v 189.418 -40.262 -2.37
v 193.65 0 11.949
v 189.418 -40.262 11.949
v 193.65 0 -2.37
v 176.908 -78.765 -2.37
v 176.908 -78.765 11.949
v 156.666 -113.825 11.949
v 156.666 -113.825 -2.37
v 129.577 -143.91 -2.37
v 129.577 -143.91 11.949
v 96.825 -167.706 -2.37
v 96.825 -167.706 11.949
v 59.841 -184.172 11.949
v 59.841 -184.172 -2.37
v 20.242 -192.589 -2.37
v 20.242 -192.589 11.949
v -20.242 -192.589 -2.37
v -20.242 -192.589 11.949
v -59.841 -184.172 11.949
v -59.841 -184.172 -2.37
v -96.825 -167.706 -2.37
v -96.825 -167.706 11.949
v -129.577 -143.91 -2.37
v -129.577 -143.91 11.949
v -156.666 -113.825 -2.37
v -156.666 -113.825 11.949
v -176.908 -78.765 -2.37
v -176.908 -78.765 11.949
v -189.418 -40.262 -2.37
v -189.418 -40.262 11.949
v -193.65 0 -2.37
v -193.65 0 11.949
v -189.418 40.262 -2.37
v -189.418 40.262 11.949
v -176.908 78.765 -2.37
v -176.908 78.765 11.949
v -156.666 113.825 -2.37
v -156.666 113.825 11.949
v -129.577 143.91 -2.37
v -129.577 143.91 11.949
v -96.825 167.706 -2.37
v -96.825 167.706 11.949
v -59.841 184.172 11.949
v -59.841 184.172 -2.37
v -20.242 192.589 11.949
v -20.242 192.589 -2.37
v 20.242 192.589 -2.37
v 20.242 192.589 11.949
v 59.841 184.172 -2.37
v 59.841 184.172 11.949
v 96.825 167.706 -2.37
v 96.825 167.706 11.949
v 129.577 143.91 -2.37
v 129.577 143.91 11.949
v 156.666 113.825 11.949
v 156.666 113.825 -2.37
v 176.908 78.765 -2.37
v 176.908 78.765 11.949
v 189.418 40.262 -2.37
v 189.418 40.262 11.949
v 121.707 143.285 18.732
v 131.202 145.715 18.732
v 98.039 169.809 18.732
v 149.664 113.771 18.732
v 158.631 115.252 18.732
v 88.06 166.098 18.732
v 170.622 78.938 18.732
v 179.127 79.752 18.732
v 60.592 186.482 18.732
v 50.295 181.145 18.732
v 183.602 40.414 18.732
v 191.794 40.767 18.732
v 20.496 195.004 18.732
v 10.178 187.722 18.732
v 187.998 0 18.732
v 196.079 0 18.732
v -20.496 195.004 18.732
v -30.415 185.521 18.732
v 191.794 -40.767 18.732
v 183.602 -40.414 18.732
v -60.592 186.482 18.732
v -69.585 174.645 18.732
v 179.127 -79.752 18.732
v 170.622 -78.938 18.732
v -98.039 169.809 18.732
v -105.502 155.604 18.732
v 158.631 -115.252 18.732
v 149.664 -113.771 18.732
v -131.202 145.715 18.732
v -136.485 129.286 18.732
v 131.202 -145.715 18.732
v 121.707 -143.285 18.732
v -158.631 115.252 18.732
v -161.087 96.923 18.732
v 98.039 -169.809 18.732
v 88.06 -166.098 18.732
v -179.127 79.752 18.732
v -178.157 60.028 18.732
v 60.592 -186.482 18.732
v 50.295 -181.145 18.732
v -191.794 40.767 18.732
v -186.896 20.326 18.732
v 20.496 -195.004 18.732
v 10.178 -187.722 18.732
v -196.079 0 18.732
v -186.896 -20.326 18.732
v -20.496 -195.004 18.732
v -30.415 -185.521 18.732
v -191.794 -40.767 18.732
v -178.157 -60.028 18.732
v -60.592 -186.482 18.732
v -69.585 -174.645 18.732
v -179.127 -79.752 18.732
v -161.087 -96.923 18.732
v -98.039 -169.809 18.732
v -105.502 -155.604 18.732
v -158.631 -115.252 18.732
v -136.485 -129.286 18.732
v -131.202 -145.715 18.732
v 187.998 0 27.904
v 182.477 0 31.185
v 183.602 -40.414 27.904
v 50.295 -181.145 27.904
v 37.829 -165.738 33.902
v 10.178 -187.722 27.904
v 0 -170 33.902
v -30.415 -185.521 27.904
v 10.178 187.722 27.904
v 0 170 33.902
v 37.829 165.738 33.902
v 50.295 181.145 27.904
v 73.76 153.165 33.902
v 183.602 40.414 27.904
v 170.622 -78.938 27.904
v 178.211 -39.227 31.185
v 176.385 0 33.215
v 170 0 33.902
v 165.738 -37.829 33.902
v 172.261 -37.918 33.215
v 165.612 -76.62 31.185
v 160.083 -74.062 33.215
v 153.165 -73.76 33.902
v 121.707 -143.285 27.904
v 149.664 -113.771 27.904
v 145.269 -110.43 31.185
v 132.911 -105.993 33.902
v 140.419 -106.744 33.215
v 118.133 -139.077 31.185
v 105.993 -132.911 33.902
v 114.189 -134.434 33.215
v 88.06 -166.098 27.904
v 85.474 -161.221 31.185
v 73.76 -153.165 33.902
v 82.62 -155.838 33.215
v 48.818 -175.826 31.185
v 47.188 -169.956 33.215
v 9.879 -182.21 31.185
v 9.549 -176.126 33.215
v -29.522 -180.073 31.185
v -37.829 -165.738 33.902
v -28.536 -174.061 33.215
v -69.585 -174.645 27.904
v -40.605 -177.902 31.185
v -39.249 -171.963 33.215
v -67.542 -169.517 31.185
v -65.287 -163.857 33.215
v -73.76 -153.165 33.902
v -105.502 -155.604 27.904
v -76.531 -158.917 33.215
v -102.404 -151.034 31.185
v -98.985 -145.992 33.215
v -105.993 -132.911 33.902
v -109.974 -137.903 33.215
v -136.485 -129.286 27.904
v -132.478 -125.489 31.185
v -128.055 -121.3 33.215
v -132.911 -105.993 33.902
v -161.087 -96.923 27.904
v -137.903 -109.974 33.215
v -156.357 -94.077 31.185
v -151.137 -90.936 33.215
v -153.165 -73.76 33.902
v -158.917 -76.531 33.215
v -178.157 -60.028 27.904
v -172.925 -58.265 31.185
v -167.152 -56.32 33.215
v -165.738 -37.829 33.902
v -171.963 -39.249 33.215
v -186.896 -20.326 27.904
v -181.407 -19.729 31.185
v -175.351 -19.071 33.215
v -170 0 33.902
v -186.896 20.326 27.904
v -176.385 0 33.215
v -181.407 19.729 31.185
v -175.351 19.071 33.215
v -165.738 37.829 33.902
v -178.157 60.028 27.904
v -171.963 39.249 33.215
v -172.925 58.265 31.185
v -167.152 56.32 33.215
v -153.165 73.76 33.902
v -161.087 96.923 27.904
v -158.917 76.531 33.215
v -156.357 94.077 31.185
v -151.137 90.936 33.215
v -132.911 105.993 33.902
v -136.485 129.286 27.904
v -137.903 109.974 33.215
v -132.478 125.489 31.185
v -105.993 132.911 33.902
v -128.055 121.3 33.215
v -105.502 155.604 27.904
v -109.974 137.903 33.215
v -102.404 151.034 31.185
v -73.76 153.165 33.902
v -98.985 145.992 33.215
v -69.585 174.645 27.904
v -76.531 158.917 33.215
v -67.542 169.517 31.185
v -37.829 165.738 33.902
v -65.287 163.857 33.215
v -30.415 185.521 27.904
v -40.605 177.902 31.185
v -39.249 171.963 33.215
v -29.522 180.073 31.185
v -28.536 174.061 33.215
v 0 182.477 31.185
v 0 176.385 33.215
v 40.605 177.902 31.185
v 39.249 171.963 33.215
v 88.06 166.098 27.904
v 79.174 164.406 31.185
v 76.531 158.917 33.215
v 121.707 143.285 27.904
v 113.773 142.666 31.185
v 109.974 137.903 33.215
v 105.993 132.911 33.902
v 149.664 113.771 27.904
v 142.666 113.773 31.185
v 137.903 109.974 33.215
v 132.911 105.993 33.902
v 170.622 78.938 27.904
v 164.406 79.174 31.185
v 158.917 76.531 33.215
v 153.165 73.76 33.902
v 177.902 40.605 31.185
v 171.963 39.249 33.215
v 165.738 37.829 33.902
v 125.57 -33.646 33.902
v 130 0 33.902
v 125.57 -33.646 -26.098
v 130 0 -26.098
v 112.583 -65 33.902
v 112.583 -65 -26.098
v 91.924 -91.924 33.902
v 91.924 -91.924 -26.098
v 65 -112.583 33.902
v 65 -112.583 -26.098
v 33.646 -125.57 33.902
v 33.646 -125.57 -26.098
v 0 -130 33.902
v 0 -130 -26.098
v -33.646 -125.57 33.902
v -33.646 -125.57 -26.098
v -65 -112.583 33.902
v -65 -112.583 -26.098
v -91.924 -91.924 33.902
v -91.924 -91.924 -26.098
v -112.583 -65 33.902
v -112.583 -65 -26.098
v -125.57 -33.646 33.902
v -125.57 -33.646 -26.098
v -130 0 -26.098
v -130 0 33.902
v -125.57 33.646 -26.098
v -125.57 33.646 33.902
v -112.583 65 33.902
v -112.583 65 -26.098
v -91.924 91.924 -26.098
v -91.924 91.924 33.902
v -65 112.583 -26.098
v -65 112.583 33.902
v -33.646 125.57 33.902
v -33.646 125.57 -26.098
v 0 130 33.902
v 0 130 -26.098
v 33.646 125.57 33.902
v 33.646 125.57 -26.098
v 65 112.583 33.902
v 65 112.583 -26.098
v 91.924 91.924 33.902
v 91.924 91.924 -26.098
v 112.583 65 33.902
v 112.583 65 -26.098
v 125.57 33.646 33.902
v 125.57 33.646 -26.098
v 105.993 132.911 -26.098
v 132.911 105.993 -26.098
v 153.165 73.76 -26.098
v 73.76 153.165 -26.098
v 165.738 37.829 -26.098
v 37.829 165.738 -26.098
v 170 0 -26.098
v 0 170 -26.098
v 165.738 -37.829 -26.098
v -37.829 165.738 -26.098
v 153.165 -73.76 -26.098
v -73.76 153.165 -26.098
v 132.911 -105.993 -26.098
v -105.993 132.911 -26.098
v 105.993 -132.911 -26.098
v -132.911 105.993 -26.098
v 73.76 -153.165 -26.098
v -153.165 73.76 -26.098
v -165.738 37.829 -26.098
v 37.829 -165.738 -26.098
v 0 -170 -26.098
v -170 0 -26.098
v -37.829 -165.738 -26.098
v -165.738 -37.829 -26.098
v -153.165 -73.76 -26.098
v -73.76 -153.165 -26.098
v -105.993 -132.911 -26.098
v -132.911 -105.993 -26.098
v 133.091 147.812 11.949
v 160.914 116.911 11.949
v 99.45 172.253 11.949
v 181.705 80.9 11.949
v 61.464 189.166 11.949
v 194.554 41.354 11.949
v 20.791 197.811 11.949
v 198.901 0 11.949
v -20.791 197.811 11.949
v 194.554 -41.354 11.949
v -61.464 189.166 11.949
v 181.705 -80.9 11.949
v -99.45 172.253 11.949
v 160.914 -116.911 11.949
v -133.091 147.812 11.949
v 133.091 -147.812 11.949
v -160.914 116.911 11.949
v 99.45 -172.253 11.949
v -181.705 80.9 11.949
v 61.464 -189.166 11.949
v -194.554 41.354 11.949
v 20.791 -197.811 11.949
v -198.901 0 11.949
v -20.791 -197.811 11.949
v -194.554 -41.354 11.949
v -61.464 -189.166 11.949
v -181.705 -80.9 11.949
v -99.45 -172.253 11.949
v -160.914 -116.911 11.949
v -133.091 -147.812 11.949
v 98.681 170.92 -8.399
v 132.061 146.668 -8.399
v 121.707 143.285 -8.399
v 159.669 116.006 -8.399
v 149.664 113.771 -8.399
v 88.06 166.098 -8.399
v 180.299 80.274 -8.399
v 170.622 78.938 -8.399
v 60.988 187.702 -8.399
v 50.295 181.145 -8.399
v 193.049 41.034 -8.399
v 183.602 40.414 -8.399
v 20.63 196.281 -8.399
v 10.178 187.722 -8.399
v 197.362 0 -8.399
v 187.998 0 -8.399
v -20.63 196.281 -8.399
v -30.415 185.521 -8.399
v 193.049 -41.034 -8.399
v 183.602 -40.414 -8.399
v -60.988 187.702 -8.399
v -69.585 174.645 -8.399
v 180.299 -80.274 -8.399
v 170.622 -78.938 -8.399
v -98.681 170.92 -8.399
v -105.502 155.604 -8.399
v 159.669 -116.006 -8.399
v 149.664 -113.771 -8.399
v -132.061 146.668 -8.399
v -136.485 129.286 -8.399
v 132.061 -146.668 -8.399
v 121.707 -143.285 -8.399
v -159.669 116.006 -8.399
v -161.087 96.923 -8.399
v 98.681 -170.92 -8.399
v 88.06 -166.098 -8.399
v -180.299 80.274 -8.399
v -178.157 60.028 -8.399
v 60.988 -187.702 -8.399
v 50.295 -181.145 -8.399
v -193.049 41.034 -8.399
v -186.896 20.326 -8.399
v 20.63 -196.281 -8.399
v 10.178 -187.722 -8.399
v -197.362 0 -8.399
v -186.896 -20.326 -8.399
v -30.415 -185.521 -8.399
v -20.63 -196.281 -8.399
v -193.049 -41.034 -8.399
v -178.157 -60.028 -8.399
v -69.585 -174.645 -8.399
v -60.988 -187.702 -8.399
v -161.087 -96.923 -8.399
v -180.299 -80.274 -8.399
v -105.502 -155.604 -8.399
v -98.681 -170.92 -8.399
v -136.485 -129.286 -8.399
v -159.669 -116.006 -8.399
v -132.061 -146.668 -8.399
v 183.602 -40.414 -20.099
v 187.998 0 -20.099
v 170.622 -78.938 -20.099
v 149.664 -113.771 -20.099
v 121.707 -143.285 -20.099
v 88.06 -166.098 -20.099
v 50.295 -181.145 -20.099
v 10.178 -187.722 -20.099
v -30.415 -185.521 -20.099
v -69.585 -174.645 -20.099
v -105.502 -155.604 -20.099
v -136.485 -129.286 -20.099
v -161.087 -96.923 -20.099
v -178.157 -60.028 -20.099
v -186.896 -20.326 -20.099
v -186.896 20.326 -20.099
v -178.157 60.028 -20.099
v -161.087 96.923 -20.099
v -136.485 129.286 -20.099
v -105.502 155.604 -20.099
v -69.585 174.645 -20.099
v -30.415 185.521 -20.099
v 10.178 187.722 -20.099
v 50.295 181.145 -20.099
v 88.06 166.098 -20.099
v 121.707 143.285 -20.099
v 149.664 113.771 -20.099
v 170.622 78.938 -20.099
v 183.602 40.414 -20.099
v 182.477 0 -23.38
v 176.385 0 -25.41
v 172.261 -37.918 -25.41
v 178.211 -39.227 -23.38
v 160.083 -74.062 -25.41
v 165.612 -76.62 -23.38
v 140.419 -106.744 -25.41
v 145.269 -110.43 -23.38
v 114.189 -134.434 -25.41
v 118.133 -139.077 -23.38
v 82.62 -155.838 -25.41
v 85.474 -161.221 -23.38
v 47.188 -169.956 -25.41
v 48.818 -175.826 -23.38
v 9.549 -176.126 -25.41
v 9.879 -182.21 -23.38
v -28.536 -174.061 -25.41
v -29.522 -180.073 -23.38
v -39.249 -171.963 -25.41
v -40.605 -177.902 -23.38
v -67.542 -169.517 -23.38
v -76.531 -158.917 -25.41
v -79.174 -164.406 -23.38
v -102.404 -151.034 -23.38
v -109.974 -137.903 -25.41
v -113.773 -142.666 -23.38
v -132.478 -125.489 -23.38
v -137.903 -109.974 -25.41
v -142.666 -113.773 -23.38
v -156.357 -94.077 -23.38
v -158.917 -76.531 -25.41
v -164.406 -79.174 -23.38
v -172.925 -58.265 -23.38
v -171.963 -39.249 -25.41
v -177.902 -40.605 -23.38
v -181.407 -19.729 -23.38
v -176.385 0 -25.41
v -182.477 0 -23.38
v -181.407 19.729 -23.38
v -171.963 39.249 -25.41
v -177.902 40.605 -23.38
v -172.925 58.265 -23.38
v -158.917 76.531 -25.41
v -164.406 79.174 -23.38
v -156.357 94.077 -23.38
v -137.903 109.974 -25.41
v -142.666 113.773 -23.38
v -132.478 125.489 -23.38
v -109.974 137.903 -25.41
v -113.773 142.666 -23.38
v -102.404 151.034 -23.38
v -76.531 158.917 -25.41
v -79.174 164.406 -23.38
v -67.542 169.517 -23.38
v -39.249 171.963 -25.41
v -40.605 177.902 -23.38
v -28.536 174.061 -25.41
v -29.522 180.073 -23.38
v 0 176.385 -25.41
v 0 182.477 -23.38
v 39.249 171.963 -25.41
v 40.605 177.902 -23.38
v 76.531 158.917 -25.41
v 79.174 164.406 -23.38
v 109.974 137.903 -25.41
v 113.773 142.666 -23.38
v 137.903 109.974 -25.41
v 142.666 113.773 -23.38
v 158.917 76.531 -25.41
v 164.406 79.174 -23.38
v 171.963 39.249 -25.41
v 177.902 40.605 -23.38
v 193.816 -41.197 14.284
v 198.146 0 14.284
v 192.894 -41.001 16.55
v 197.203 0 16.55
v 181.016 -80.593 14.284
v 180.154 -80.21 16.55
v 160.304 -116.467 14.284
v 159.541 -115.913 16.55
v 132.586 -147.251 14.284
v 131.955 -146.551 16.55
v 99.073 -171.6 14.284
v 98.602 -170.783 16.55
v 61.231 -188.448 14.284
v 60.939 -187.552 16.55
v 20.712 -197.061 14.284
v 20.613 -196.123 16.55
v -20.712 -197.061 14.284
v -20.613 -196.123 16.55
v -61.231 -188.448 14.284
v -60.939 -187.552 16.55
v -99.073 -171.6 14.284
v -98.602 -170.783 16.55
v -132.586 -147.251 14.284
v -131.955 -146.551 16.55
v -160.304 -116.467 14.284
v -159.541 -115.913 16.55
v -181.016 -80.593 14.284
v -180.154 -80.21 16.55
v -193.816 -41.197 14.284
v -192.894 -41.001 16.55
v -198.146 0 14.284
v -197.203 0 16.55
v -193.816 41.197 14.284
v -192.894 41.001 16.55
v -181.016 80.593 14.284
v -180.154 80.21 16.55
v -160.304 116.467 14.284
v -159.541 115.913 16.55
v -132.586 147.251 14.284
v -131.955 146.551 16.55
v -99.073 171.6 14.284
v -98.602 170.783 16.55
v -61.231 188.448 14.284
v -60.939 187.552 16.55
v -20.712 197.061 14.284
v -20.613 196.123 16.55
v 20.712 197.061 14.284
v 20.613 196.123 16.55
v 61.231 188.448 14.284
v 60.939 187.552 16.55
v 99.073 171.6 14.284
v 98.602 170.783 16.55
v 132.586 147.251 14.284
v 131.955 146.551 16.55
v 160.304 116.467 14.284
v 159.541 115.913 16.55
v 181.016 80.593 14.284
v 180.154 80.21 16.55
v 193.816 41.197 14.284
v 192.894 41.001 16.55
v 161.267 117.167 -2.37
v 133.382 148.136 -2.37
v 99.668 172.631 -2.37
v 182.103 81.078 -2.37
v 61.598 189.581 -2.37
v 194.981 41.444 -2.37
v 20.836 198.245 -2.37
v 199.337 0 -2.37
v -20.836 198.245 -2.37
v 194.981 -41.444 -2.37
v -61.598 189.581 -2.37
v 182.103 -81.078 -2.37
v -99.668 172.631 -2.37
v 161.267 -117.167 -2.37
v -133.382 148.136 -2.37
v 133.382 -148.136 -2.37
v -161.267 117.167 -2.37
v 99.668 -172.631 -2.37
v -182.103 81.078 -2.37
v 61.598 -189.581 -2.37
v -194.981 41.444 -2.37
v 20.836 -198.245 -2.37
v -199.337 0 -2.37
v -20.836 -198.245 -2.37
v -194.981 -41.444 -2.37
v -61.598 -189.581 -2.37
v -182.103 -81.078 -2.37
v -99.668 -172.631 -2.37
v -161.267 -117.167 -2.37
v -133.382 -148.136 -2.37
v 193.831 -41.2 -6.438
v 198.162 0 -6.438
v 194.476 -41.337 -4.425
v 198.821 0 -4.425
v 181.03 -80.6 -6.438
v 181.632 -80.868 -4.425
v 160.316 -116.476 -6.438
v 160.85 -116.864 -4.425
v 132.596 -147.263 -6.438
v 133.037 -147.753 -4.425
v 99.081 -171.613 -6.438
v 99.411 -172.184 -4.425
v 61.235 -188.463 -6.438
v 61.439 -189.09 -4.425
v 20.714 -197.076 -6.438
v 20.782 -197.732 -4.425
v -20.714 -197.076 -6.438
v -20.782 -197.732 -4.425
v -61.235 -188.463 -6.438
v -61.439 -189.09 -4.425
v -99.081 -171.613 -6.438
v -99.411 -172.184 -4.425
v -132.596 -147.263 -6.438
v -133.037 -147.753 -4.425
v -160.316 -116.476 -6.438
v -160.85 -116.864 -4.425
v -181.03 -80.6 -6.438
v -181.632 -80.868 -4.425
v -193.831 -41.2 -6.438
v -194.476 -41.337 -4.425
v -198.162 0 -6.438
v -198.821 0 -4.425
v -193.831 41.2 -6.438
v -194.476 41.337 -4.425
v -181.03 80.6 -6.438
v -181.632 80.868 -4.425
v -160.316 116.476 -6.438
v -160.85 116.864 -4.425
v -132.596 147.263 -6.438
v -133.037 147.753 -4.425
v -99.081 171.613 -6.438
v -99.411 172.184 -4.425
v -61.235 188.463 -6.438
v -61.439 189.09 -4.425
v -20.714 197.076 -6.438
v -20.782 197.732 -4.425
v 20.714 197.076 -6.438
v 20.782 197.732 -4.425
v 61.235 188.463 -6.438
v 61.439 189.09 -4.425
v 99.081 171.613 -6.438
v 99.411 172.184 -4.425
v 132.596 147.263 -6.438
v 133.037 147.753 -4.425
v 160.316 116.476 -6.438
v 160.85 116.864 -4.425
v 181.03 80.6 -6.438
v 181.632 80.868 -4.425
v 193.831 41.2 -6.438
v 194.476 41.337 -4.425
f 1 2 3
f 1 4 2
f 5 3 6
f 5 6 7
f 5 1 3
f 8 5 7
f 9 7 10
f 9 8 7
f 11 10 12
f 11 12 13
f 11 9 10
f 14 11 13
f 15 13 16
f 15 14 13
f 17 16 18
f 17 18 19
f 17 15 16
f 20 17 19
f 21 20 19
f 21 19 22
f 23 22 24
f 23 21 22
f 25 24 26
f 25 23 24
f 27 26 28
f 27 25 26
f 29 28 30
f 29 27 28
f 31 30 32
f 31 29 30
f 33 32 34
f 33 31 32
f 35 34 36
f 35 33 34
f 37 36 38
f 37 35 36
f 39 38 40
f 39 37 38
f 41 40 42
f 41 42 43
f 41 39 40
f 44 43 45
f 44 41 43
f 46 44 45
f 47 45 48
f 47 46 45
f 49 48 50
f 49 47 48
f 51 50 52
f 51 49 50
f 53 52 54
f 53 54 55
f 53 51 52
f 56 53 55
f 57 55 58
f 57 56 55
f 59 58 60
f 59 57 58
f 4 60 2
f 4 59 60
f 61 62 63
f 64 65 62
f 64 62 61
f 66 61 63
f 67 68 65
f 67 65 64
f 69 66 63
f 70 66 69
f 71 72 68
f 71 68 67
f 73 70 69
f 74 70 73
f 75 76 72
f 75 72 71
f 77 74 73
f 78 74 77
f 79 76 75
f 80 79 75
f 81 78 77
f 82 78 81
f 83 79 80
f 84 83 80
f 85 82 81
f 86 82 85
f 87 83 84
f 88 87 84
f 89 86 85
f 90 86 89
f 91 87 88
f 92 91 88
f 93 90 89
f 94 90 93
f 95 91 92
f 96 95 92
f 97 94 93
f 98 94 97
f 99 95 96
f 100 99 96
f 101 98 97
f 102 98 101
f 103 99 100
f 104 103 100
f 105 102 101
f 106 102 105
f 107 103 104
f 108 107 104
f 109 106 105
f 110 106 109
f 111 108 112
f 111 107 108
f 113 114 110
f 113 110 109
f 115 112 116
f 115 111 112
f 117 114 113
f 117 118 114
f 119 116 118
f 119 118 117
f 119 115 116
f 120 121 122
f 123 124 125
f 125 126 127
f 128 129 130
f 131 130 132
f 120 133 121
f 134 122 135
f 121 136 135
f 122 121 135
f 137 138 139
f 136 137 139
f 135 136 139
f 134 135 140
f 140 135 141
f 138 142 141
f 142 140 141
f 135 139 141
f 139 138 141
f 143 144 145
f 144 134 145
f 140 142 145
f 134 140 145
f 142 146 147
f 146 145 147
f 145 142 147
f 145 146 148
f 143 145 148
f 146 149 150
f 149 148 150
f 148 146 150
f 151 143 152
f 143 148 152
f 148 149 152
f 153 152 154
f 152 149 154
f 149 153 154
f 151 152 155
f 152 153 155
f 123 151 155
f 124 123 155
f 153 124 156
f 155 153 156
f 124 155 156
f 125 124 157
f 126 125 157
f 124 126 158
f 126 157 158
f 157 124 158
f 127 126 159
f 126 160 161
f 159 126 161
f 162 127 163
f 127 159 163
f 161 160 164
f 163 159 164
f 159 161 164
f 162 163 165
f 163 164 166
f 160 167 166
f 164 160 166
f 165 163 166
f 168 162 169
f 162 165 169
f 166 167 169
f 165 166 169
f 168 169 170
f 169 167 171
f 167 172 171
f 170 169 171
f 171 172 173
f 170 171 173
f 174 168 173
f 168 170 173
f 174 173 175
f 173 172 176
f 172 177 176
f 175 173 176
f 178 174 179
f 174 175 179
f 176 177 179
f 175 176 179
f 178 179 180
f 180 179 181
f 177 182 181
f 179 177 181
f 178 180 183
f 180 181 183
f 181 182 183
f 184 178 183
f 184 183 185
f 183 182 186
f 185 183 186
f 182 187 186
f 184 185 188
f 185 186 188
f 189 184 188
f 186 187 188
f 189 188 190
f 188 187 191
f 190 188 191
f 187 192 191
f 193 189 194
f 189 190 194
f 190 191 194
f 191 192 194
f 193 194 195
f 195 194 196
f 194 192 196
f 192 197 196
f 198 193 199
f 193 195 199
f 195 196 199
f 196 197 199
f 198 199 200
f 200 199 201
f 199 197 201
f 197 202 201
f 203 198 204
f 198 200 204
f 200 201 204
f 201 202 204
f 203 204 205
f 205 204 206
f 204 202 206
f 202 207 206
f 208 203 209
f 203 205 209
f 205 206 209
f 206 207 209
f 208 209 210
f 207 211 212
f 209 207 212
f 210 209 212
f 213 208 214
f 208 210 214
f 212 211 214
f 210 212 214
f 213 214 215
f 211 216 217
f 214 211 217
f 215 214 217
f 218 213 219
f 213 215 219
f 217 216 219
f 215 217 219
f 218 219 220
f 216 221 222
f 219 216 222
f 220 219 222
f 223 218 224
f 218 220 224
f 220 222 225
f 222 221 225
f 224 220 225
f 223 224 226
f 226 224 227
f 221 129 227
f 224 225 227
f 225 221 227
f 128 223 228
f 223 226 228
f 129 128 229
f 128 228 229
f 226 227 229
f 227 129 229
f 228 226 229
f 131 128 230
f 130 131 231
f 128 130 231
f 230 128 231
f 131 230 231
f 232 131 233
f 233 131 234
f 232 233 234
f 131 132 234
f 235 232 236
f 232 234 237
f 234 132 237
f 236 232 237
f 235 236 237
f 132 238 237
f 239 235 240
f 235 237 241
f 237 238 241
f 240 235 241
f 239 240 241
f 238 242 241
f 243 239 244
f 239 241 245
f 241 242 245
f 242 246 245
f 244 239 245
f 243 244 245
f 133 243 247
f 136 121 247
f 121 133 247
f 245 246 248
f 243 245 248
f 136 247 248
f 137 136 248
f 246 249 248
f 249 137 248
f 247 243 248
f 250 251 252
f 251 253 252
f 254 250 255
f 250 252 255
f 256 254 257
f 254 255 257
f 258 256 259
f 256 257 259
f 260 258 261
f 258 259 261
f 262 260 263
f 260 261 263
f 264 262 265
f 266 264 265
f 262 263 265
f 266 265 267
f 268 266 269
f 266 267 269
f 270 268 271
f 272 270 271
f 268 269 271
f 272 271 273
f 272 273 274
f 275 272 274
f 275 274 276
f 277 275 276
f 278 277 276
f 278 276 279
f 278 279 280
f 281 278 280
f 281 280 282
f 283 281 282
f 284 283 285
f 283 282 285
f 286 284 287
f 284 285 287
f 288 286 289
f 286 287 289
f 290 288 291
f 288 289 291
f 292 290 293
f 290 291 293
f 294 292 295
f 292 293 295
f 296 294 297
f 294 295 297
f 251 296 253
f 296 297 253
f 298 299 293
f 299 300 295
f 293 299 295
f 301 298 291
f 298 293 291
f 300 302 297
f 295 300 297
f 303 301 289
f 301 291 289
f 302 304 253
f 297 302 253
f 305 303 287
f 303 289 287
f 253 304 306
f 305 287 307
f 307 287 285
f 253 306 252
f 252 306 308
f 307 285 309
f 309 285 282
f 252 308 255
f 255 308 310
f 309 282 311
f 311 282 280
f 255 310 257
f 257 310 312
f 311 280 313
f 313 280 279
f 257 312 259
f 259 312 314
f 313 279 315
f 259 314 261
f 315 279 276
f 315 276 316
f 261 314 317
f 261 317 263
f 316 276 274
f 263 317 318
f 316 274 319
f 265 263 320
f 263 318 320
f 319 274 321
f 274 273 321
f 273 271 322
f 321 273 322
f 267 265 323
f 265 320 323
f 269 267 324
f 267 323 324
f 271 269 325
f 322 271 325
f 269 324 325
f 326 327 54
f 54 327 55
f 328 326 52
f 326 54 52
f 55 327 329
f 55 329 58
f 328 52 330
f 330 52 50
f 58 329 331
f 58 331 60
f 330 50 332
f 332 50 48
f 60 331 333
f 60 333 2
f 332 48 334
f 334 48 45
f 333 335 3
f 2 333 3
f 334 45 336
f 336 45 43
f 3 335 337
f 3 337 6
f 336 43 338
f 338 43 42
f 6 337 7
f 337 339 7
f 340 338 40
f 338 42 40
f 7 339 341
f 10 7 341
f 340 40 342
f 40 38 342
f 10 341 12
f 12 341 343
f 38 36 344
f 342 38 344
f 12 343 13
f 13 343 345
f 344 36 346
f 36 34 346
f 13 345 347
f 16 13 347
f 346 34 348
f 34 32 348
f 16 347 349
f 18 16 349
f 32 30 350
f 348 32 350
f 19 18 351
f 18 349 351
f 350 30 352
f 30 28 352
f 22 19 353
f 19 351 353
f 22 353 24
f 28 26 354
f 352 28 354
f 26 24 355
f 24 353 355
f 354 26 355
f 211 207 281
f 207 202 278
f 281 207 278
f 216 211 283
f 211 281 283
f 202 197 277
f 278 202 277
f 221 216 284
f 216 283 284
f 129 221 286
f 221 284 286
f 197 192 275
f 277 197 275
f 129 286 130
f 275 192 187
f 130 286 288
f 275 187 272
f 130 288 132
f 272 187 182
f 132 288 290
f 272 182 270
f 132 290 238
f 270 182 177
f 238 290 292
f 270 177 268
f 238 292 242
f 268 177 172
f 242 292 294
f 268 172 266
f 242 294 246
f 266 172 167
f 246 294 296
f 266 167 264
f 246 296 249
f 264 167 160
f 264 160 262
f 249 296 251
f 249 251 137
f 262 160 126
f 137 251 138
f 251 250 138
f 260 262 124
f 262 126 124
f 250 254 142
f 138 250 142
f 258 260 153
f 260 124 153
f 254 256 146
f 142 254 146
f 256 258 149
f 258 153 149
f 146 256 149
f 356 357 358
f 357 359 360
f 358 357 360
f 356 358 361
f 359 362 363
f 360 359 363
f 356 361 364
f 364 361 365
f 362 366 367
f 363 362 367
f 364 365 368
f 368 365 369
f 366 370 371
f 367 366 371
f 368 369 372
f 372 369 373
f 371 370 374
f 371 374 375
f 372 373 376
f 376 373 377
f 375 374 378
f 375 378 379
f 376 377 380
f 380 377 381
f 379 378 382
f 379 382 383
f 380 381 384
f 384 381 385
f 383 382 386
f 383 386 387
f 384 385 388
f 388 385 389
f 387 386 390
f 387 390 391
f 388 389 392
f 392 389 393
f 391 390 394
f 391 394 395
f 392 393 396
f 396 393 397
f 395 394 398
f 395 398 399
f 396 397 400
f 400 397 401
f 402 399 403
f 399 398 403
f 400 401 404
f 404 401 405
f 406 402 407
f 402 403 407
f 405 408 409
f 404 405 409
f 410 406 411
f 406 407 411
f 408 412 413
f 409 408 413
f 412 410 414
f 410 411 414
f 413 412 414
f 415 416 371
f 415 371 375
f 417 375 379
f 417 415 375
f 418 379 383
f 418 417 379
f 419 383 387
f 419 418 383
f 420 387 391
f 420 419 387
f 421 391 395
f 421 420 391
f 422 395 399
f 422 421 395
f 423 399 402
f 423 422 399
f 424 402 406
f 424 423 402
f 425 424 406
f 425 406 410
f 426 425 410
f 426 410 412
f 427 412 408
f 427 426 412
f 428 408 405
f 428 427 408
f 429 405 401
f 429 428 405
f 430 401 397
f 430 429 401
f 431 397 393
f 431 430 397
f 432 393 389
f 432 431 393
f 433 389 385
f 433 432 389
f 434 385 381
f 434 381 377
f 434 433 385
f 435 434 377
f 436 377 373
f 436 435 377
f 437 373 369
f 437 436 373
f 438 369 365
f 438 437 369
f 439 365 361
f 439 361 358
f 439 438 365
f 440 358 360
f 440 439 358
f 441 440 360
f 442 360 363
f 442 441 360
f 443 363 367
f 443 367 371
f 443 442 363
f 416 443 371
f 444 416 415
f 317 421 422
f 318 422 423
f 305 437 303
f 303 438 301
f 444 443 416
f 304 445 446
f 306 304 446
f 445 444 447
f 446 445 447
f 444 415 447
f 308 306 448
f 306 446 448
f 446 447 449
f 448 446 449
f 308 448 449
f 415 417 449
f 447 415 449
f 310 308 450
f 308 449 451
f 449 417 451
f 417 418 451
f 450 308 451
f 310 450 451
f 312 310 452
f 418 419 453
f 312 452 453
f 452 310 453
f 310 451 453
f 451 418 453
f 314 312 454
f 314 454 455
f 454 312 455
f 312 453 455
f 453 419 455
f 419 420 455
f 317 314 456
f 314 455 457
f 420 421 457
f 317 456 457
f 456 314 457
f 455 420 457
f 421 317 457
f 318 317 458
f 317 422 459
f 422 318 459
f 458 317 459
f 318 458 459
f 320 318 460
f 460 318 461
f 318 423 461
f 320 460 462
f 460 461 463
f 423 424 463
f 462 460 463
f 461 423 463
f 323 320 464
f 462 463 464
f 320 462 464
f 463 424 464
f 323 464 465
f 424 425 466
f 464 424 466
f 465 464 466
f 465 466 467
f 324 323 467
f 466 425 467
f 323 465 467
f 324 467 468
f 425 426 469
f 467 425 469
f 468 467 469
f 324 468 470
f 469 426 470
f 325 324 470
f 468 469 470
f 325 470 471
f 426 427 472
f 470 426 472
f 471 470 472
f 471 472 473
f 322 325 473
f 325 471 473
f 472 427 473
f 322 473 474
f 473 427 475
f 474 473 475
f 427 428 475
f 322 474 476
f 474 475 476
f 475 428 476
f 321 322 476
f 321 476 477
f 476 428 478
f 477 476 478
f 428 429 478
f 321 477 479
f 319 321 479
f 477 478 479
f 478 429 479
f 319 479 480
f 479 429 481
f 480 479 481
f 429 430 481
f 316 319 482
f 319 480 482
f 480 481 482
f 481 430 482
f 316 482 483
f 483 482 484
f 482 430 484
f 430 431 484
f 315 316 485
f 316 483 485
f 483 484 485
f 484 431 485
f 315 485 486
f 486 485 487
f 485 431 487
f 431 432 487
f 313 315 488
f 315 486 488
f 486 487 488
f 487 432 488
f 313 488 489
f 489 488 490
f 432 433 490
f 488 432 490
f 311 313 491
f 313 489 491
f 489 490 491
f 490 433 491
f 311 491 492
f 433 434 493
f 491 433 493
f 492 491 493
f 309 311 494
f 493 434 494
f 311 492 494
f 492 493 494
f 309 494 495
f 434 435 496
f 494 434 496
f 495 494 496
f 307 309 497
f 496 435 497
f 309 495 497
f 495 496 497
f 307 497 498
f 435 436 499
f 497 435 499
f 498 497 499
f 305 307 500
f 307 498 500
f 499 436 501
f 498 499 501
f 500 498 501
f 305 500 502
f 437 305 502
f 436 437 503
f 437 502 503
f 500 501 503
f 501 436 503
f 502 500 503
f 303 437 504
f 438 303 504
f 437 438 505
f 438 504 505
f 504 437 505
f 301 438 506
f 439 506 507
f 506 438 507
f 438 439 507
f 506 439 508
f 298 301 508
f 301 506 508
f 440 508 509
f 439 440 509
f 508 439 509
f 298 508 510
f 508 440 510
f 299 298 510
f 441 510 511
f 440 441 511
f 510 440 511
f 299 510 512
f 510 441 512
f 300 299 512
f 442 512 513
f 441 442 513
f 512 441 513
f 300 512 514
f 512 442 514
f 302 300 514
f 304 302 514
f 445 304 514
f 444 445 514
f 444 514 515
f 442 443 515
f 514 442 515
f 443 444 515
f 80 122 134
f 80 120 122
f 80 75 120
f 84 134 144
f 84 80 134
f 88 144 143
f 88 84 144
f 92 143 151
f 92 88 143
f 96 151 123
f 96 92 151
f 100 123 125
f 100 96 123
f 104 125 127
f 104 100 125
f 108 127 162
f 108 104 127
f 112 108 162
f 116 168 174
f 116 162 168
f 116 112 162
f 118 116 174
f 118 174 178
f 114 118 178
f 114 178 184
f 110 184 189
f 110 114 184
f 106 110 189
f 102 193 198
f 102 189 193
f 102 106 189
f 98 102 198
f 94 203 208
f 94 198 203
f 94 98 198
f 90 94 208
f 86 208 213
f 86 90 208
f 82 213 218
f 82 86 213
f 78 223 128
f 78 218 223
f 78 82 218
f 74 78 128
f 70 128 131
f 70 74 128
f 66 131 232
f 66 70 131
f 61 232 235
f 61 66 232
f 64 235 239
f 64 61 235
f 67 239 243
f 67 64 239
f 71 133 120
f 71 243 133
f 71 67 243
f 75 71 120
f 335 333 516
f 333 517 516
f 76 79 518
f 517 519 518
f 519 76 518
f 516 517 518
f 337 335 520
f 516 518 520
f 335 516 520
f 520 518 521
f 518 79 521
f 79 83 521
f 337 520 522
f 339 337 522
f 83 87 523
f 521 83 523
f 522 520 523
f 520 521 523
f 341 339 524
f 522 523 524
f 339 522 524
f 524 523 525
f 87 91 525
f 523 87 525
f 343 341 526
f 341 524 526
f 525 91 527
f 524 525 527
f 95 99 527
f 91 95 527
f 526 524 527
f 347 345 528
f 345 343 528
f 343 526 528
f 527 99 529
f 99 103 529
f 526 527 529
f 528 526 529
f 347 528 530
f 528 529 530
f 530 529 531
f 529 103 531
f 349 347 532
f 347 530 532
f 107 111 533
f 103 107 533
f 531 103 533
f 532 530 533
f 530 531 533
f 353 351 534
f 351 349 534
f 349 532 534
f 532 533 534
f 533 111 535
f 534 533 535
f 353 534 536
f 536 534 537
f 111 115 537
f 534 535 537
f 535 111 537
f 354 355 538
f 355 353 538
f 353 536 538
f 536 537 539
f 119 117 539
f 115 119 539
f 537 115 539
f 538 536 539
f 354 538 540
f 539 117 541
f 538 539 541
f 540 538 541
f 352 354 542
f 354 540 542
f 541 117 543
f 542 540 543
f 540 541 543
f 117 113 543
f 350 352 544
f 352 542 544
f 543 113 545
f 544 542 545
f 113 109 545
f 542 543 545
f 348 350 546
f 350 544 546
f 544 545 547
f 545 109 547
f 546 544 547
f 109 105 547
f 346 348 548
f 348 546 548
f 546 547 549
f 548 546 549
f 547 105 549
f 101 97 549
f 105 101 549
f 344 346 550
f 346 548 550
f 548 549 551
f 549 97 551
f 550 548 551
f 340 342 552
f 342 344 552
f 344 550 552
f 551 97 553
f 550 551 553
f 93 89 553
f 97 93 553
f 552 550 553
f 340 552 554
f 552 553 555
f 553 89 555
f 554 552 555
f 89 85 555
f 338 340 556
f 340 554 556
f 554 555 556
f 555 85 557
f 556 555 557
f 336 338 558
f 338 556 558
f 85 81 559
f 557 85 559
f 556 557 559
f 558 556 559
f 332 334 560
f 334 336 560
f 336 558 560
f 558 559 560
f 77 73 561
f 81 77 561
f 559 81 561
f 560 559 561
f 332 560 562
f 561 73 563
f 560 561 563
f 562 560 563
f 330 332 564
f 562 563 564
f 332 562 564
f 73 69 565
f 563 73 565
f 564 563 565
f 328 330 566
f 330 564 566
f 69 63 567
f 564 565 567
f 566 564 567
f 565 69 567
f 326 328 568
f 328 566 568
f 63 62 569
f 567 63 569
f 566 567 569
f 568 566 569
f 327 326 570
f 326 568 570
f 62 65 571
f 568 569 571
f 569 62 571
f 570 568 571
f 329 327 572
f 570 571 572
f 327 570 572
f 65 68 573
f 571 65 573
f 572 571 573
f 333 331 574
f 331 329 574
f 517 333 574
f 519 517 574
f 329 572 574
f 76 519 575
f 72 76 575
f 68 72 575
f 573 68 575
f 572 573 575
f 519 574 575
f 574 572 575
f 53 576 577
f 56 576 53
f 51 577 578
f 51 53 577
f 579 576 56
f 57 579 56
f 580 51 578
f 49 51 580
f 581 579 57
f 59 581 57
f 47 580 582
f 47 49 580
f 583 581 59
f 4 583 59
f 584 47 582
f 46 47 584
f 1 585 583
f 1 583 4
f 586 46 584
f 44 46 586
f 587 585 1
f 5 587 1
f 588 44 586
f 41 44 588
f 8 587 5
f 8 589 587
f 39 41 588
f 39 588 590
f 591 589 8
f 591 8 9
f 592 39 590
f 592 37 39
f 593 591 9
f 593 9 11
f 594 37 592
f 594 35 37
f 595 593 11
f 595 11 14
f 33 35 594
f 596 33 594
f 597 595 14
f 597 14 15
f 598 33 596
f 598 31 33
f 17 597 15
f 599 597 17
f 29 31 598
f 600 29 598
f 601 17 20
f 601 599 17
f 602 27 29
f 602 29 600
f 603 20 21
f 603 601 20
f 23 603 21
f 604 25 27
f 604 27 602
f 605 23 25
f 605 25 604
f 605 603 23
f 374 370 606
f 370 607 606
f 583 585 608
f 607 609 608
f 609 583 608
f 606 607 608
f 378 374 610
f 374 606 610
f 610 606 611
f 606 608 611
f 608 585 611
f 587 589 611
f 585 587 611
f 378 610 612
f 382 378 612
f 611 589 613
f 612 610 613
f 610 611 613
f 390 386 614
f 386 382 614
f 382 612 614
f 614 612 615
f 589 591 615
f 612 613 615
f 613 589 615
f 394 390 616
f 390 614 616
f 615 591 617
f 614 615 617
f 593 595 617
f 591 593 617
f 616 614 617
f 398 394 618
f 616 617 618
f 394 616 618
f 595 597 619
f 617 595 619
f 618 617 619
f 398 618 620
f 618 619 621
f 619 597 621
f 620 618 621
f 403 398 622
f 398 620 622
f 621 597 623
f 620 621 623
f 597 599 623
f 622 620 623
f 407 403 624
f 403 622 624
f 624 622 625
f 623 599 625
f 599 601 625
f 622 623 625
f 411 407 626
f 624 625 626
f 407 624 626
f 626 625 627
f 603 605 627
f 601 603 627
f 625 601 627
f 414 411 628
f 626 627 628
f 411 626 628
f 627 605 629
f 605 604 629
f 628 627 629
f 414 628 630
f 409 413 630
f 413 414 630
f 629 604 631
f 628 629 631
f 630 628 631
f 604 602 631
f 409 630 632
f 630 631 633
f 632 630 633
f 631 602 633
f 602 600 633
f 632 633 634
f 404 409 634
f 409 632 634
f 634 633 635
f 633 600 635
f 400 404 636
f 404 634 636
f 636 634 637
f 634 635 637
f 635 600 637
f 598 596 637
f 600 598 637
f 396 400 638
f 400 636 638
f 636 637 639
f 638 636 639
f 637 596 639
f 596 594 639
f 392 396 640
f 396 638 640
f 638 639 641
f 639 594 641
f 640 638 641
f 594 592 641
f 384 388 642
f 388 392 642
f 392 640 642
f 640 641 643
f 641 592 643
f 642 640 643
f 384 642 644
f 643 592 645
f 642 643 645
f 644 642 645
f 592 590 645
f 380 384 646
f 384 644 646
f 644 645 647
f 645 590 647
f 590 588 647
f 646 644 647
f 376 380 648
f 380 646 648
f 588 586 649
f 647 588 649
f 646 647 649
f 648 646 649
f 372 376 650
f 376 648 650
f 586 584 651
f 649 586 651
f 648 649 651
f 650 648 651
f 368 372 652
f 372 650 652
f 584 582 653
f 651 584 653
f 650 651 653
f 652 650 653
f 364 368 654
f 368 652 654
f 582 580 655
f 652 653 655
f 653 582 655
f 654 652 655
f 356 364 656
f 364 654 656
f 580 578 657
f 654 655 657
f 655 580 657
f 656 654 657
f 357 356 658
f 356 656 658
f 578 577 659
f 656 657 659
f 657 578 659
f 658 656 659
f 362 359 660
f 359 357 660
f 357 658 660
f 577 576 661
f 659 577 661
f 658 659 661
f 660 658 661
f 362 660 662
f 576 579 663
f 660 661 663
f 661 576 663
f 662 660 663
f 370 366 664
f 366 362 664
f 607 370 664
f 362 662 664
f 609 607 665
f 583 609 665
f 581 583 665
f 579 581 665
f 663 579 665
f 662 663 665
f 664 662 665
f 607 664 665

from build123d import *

# Parameters (mm, degrees)
SKETCH3_W   = 14.319236131
SKETCH3_H   = 126.612193163
SKETCH3_W_2 = 30.145760277
SKETCH3_H_2 = 185.396425703
SKETCH3_W_3 = 12.058304111
SKETCH3_H_3 = 222.324982043


with BuildPart() as part:
    # Sketch2 → Revolve1 (revolve)
    with BuildSketch(Plane(origin=(0, 0, 0), x_dir=(0, 0, -1), z_dir=(1, 0, 0)), mode=Mode.PRIVATE) as revolve1_sk:
        with BuildLine():
            Line((-33.902439024, 170), (-33.902439024, 130))
            Line((-33.902439024, 130), (26.097560976, 130))
            Line((26.097560976, 130), (26.097560976, 170))
            ThreePointArc((26.097560976, 170), (-3.902439024, 200), (-33.902439024, 170))
        make_face()
    revolve(revolve1_sk.sketch.rotate(Axis((0, 0, 102.578397213), (0, 0, -1)), 90), axis=Axis((0, 0, 102.578397213), (0, 0, -1)))

    # Sketch3 → Cut-Revolve1 (revolve, cut)
    with BuildSketch(Plane(origin=(0, 0, 0), x_dir=(0, 0, -1), z_dir=(1, 0, 0)), mode=Mode.PRIVATE) as cut_revolve1_sk:
        with Locations((-4.789385206, 256.956129248)):
            Rectangle(SKETCH3_W, SKETCH3_H)
        with Locations((-33.804679472, 280.695915466)):
            Rectangle(SKETCH3_W_2, SKETCH3_H_2)
        with Locations((14.428536971, 299.160193636)):
            Rectangle(SKETCH3_W_3, SKETCH3_H_3)
    revolve(cut_revolve1_sk.sketch.rotate(Axis((0, 0, 101.363868033), (0, 0, -1)), 90), axis=Axis((0, 0, 101.363868033), (0, 0, -1)), mode=Mode.SUBTRACT)


solid = part.part
